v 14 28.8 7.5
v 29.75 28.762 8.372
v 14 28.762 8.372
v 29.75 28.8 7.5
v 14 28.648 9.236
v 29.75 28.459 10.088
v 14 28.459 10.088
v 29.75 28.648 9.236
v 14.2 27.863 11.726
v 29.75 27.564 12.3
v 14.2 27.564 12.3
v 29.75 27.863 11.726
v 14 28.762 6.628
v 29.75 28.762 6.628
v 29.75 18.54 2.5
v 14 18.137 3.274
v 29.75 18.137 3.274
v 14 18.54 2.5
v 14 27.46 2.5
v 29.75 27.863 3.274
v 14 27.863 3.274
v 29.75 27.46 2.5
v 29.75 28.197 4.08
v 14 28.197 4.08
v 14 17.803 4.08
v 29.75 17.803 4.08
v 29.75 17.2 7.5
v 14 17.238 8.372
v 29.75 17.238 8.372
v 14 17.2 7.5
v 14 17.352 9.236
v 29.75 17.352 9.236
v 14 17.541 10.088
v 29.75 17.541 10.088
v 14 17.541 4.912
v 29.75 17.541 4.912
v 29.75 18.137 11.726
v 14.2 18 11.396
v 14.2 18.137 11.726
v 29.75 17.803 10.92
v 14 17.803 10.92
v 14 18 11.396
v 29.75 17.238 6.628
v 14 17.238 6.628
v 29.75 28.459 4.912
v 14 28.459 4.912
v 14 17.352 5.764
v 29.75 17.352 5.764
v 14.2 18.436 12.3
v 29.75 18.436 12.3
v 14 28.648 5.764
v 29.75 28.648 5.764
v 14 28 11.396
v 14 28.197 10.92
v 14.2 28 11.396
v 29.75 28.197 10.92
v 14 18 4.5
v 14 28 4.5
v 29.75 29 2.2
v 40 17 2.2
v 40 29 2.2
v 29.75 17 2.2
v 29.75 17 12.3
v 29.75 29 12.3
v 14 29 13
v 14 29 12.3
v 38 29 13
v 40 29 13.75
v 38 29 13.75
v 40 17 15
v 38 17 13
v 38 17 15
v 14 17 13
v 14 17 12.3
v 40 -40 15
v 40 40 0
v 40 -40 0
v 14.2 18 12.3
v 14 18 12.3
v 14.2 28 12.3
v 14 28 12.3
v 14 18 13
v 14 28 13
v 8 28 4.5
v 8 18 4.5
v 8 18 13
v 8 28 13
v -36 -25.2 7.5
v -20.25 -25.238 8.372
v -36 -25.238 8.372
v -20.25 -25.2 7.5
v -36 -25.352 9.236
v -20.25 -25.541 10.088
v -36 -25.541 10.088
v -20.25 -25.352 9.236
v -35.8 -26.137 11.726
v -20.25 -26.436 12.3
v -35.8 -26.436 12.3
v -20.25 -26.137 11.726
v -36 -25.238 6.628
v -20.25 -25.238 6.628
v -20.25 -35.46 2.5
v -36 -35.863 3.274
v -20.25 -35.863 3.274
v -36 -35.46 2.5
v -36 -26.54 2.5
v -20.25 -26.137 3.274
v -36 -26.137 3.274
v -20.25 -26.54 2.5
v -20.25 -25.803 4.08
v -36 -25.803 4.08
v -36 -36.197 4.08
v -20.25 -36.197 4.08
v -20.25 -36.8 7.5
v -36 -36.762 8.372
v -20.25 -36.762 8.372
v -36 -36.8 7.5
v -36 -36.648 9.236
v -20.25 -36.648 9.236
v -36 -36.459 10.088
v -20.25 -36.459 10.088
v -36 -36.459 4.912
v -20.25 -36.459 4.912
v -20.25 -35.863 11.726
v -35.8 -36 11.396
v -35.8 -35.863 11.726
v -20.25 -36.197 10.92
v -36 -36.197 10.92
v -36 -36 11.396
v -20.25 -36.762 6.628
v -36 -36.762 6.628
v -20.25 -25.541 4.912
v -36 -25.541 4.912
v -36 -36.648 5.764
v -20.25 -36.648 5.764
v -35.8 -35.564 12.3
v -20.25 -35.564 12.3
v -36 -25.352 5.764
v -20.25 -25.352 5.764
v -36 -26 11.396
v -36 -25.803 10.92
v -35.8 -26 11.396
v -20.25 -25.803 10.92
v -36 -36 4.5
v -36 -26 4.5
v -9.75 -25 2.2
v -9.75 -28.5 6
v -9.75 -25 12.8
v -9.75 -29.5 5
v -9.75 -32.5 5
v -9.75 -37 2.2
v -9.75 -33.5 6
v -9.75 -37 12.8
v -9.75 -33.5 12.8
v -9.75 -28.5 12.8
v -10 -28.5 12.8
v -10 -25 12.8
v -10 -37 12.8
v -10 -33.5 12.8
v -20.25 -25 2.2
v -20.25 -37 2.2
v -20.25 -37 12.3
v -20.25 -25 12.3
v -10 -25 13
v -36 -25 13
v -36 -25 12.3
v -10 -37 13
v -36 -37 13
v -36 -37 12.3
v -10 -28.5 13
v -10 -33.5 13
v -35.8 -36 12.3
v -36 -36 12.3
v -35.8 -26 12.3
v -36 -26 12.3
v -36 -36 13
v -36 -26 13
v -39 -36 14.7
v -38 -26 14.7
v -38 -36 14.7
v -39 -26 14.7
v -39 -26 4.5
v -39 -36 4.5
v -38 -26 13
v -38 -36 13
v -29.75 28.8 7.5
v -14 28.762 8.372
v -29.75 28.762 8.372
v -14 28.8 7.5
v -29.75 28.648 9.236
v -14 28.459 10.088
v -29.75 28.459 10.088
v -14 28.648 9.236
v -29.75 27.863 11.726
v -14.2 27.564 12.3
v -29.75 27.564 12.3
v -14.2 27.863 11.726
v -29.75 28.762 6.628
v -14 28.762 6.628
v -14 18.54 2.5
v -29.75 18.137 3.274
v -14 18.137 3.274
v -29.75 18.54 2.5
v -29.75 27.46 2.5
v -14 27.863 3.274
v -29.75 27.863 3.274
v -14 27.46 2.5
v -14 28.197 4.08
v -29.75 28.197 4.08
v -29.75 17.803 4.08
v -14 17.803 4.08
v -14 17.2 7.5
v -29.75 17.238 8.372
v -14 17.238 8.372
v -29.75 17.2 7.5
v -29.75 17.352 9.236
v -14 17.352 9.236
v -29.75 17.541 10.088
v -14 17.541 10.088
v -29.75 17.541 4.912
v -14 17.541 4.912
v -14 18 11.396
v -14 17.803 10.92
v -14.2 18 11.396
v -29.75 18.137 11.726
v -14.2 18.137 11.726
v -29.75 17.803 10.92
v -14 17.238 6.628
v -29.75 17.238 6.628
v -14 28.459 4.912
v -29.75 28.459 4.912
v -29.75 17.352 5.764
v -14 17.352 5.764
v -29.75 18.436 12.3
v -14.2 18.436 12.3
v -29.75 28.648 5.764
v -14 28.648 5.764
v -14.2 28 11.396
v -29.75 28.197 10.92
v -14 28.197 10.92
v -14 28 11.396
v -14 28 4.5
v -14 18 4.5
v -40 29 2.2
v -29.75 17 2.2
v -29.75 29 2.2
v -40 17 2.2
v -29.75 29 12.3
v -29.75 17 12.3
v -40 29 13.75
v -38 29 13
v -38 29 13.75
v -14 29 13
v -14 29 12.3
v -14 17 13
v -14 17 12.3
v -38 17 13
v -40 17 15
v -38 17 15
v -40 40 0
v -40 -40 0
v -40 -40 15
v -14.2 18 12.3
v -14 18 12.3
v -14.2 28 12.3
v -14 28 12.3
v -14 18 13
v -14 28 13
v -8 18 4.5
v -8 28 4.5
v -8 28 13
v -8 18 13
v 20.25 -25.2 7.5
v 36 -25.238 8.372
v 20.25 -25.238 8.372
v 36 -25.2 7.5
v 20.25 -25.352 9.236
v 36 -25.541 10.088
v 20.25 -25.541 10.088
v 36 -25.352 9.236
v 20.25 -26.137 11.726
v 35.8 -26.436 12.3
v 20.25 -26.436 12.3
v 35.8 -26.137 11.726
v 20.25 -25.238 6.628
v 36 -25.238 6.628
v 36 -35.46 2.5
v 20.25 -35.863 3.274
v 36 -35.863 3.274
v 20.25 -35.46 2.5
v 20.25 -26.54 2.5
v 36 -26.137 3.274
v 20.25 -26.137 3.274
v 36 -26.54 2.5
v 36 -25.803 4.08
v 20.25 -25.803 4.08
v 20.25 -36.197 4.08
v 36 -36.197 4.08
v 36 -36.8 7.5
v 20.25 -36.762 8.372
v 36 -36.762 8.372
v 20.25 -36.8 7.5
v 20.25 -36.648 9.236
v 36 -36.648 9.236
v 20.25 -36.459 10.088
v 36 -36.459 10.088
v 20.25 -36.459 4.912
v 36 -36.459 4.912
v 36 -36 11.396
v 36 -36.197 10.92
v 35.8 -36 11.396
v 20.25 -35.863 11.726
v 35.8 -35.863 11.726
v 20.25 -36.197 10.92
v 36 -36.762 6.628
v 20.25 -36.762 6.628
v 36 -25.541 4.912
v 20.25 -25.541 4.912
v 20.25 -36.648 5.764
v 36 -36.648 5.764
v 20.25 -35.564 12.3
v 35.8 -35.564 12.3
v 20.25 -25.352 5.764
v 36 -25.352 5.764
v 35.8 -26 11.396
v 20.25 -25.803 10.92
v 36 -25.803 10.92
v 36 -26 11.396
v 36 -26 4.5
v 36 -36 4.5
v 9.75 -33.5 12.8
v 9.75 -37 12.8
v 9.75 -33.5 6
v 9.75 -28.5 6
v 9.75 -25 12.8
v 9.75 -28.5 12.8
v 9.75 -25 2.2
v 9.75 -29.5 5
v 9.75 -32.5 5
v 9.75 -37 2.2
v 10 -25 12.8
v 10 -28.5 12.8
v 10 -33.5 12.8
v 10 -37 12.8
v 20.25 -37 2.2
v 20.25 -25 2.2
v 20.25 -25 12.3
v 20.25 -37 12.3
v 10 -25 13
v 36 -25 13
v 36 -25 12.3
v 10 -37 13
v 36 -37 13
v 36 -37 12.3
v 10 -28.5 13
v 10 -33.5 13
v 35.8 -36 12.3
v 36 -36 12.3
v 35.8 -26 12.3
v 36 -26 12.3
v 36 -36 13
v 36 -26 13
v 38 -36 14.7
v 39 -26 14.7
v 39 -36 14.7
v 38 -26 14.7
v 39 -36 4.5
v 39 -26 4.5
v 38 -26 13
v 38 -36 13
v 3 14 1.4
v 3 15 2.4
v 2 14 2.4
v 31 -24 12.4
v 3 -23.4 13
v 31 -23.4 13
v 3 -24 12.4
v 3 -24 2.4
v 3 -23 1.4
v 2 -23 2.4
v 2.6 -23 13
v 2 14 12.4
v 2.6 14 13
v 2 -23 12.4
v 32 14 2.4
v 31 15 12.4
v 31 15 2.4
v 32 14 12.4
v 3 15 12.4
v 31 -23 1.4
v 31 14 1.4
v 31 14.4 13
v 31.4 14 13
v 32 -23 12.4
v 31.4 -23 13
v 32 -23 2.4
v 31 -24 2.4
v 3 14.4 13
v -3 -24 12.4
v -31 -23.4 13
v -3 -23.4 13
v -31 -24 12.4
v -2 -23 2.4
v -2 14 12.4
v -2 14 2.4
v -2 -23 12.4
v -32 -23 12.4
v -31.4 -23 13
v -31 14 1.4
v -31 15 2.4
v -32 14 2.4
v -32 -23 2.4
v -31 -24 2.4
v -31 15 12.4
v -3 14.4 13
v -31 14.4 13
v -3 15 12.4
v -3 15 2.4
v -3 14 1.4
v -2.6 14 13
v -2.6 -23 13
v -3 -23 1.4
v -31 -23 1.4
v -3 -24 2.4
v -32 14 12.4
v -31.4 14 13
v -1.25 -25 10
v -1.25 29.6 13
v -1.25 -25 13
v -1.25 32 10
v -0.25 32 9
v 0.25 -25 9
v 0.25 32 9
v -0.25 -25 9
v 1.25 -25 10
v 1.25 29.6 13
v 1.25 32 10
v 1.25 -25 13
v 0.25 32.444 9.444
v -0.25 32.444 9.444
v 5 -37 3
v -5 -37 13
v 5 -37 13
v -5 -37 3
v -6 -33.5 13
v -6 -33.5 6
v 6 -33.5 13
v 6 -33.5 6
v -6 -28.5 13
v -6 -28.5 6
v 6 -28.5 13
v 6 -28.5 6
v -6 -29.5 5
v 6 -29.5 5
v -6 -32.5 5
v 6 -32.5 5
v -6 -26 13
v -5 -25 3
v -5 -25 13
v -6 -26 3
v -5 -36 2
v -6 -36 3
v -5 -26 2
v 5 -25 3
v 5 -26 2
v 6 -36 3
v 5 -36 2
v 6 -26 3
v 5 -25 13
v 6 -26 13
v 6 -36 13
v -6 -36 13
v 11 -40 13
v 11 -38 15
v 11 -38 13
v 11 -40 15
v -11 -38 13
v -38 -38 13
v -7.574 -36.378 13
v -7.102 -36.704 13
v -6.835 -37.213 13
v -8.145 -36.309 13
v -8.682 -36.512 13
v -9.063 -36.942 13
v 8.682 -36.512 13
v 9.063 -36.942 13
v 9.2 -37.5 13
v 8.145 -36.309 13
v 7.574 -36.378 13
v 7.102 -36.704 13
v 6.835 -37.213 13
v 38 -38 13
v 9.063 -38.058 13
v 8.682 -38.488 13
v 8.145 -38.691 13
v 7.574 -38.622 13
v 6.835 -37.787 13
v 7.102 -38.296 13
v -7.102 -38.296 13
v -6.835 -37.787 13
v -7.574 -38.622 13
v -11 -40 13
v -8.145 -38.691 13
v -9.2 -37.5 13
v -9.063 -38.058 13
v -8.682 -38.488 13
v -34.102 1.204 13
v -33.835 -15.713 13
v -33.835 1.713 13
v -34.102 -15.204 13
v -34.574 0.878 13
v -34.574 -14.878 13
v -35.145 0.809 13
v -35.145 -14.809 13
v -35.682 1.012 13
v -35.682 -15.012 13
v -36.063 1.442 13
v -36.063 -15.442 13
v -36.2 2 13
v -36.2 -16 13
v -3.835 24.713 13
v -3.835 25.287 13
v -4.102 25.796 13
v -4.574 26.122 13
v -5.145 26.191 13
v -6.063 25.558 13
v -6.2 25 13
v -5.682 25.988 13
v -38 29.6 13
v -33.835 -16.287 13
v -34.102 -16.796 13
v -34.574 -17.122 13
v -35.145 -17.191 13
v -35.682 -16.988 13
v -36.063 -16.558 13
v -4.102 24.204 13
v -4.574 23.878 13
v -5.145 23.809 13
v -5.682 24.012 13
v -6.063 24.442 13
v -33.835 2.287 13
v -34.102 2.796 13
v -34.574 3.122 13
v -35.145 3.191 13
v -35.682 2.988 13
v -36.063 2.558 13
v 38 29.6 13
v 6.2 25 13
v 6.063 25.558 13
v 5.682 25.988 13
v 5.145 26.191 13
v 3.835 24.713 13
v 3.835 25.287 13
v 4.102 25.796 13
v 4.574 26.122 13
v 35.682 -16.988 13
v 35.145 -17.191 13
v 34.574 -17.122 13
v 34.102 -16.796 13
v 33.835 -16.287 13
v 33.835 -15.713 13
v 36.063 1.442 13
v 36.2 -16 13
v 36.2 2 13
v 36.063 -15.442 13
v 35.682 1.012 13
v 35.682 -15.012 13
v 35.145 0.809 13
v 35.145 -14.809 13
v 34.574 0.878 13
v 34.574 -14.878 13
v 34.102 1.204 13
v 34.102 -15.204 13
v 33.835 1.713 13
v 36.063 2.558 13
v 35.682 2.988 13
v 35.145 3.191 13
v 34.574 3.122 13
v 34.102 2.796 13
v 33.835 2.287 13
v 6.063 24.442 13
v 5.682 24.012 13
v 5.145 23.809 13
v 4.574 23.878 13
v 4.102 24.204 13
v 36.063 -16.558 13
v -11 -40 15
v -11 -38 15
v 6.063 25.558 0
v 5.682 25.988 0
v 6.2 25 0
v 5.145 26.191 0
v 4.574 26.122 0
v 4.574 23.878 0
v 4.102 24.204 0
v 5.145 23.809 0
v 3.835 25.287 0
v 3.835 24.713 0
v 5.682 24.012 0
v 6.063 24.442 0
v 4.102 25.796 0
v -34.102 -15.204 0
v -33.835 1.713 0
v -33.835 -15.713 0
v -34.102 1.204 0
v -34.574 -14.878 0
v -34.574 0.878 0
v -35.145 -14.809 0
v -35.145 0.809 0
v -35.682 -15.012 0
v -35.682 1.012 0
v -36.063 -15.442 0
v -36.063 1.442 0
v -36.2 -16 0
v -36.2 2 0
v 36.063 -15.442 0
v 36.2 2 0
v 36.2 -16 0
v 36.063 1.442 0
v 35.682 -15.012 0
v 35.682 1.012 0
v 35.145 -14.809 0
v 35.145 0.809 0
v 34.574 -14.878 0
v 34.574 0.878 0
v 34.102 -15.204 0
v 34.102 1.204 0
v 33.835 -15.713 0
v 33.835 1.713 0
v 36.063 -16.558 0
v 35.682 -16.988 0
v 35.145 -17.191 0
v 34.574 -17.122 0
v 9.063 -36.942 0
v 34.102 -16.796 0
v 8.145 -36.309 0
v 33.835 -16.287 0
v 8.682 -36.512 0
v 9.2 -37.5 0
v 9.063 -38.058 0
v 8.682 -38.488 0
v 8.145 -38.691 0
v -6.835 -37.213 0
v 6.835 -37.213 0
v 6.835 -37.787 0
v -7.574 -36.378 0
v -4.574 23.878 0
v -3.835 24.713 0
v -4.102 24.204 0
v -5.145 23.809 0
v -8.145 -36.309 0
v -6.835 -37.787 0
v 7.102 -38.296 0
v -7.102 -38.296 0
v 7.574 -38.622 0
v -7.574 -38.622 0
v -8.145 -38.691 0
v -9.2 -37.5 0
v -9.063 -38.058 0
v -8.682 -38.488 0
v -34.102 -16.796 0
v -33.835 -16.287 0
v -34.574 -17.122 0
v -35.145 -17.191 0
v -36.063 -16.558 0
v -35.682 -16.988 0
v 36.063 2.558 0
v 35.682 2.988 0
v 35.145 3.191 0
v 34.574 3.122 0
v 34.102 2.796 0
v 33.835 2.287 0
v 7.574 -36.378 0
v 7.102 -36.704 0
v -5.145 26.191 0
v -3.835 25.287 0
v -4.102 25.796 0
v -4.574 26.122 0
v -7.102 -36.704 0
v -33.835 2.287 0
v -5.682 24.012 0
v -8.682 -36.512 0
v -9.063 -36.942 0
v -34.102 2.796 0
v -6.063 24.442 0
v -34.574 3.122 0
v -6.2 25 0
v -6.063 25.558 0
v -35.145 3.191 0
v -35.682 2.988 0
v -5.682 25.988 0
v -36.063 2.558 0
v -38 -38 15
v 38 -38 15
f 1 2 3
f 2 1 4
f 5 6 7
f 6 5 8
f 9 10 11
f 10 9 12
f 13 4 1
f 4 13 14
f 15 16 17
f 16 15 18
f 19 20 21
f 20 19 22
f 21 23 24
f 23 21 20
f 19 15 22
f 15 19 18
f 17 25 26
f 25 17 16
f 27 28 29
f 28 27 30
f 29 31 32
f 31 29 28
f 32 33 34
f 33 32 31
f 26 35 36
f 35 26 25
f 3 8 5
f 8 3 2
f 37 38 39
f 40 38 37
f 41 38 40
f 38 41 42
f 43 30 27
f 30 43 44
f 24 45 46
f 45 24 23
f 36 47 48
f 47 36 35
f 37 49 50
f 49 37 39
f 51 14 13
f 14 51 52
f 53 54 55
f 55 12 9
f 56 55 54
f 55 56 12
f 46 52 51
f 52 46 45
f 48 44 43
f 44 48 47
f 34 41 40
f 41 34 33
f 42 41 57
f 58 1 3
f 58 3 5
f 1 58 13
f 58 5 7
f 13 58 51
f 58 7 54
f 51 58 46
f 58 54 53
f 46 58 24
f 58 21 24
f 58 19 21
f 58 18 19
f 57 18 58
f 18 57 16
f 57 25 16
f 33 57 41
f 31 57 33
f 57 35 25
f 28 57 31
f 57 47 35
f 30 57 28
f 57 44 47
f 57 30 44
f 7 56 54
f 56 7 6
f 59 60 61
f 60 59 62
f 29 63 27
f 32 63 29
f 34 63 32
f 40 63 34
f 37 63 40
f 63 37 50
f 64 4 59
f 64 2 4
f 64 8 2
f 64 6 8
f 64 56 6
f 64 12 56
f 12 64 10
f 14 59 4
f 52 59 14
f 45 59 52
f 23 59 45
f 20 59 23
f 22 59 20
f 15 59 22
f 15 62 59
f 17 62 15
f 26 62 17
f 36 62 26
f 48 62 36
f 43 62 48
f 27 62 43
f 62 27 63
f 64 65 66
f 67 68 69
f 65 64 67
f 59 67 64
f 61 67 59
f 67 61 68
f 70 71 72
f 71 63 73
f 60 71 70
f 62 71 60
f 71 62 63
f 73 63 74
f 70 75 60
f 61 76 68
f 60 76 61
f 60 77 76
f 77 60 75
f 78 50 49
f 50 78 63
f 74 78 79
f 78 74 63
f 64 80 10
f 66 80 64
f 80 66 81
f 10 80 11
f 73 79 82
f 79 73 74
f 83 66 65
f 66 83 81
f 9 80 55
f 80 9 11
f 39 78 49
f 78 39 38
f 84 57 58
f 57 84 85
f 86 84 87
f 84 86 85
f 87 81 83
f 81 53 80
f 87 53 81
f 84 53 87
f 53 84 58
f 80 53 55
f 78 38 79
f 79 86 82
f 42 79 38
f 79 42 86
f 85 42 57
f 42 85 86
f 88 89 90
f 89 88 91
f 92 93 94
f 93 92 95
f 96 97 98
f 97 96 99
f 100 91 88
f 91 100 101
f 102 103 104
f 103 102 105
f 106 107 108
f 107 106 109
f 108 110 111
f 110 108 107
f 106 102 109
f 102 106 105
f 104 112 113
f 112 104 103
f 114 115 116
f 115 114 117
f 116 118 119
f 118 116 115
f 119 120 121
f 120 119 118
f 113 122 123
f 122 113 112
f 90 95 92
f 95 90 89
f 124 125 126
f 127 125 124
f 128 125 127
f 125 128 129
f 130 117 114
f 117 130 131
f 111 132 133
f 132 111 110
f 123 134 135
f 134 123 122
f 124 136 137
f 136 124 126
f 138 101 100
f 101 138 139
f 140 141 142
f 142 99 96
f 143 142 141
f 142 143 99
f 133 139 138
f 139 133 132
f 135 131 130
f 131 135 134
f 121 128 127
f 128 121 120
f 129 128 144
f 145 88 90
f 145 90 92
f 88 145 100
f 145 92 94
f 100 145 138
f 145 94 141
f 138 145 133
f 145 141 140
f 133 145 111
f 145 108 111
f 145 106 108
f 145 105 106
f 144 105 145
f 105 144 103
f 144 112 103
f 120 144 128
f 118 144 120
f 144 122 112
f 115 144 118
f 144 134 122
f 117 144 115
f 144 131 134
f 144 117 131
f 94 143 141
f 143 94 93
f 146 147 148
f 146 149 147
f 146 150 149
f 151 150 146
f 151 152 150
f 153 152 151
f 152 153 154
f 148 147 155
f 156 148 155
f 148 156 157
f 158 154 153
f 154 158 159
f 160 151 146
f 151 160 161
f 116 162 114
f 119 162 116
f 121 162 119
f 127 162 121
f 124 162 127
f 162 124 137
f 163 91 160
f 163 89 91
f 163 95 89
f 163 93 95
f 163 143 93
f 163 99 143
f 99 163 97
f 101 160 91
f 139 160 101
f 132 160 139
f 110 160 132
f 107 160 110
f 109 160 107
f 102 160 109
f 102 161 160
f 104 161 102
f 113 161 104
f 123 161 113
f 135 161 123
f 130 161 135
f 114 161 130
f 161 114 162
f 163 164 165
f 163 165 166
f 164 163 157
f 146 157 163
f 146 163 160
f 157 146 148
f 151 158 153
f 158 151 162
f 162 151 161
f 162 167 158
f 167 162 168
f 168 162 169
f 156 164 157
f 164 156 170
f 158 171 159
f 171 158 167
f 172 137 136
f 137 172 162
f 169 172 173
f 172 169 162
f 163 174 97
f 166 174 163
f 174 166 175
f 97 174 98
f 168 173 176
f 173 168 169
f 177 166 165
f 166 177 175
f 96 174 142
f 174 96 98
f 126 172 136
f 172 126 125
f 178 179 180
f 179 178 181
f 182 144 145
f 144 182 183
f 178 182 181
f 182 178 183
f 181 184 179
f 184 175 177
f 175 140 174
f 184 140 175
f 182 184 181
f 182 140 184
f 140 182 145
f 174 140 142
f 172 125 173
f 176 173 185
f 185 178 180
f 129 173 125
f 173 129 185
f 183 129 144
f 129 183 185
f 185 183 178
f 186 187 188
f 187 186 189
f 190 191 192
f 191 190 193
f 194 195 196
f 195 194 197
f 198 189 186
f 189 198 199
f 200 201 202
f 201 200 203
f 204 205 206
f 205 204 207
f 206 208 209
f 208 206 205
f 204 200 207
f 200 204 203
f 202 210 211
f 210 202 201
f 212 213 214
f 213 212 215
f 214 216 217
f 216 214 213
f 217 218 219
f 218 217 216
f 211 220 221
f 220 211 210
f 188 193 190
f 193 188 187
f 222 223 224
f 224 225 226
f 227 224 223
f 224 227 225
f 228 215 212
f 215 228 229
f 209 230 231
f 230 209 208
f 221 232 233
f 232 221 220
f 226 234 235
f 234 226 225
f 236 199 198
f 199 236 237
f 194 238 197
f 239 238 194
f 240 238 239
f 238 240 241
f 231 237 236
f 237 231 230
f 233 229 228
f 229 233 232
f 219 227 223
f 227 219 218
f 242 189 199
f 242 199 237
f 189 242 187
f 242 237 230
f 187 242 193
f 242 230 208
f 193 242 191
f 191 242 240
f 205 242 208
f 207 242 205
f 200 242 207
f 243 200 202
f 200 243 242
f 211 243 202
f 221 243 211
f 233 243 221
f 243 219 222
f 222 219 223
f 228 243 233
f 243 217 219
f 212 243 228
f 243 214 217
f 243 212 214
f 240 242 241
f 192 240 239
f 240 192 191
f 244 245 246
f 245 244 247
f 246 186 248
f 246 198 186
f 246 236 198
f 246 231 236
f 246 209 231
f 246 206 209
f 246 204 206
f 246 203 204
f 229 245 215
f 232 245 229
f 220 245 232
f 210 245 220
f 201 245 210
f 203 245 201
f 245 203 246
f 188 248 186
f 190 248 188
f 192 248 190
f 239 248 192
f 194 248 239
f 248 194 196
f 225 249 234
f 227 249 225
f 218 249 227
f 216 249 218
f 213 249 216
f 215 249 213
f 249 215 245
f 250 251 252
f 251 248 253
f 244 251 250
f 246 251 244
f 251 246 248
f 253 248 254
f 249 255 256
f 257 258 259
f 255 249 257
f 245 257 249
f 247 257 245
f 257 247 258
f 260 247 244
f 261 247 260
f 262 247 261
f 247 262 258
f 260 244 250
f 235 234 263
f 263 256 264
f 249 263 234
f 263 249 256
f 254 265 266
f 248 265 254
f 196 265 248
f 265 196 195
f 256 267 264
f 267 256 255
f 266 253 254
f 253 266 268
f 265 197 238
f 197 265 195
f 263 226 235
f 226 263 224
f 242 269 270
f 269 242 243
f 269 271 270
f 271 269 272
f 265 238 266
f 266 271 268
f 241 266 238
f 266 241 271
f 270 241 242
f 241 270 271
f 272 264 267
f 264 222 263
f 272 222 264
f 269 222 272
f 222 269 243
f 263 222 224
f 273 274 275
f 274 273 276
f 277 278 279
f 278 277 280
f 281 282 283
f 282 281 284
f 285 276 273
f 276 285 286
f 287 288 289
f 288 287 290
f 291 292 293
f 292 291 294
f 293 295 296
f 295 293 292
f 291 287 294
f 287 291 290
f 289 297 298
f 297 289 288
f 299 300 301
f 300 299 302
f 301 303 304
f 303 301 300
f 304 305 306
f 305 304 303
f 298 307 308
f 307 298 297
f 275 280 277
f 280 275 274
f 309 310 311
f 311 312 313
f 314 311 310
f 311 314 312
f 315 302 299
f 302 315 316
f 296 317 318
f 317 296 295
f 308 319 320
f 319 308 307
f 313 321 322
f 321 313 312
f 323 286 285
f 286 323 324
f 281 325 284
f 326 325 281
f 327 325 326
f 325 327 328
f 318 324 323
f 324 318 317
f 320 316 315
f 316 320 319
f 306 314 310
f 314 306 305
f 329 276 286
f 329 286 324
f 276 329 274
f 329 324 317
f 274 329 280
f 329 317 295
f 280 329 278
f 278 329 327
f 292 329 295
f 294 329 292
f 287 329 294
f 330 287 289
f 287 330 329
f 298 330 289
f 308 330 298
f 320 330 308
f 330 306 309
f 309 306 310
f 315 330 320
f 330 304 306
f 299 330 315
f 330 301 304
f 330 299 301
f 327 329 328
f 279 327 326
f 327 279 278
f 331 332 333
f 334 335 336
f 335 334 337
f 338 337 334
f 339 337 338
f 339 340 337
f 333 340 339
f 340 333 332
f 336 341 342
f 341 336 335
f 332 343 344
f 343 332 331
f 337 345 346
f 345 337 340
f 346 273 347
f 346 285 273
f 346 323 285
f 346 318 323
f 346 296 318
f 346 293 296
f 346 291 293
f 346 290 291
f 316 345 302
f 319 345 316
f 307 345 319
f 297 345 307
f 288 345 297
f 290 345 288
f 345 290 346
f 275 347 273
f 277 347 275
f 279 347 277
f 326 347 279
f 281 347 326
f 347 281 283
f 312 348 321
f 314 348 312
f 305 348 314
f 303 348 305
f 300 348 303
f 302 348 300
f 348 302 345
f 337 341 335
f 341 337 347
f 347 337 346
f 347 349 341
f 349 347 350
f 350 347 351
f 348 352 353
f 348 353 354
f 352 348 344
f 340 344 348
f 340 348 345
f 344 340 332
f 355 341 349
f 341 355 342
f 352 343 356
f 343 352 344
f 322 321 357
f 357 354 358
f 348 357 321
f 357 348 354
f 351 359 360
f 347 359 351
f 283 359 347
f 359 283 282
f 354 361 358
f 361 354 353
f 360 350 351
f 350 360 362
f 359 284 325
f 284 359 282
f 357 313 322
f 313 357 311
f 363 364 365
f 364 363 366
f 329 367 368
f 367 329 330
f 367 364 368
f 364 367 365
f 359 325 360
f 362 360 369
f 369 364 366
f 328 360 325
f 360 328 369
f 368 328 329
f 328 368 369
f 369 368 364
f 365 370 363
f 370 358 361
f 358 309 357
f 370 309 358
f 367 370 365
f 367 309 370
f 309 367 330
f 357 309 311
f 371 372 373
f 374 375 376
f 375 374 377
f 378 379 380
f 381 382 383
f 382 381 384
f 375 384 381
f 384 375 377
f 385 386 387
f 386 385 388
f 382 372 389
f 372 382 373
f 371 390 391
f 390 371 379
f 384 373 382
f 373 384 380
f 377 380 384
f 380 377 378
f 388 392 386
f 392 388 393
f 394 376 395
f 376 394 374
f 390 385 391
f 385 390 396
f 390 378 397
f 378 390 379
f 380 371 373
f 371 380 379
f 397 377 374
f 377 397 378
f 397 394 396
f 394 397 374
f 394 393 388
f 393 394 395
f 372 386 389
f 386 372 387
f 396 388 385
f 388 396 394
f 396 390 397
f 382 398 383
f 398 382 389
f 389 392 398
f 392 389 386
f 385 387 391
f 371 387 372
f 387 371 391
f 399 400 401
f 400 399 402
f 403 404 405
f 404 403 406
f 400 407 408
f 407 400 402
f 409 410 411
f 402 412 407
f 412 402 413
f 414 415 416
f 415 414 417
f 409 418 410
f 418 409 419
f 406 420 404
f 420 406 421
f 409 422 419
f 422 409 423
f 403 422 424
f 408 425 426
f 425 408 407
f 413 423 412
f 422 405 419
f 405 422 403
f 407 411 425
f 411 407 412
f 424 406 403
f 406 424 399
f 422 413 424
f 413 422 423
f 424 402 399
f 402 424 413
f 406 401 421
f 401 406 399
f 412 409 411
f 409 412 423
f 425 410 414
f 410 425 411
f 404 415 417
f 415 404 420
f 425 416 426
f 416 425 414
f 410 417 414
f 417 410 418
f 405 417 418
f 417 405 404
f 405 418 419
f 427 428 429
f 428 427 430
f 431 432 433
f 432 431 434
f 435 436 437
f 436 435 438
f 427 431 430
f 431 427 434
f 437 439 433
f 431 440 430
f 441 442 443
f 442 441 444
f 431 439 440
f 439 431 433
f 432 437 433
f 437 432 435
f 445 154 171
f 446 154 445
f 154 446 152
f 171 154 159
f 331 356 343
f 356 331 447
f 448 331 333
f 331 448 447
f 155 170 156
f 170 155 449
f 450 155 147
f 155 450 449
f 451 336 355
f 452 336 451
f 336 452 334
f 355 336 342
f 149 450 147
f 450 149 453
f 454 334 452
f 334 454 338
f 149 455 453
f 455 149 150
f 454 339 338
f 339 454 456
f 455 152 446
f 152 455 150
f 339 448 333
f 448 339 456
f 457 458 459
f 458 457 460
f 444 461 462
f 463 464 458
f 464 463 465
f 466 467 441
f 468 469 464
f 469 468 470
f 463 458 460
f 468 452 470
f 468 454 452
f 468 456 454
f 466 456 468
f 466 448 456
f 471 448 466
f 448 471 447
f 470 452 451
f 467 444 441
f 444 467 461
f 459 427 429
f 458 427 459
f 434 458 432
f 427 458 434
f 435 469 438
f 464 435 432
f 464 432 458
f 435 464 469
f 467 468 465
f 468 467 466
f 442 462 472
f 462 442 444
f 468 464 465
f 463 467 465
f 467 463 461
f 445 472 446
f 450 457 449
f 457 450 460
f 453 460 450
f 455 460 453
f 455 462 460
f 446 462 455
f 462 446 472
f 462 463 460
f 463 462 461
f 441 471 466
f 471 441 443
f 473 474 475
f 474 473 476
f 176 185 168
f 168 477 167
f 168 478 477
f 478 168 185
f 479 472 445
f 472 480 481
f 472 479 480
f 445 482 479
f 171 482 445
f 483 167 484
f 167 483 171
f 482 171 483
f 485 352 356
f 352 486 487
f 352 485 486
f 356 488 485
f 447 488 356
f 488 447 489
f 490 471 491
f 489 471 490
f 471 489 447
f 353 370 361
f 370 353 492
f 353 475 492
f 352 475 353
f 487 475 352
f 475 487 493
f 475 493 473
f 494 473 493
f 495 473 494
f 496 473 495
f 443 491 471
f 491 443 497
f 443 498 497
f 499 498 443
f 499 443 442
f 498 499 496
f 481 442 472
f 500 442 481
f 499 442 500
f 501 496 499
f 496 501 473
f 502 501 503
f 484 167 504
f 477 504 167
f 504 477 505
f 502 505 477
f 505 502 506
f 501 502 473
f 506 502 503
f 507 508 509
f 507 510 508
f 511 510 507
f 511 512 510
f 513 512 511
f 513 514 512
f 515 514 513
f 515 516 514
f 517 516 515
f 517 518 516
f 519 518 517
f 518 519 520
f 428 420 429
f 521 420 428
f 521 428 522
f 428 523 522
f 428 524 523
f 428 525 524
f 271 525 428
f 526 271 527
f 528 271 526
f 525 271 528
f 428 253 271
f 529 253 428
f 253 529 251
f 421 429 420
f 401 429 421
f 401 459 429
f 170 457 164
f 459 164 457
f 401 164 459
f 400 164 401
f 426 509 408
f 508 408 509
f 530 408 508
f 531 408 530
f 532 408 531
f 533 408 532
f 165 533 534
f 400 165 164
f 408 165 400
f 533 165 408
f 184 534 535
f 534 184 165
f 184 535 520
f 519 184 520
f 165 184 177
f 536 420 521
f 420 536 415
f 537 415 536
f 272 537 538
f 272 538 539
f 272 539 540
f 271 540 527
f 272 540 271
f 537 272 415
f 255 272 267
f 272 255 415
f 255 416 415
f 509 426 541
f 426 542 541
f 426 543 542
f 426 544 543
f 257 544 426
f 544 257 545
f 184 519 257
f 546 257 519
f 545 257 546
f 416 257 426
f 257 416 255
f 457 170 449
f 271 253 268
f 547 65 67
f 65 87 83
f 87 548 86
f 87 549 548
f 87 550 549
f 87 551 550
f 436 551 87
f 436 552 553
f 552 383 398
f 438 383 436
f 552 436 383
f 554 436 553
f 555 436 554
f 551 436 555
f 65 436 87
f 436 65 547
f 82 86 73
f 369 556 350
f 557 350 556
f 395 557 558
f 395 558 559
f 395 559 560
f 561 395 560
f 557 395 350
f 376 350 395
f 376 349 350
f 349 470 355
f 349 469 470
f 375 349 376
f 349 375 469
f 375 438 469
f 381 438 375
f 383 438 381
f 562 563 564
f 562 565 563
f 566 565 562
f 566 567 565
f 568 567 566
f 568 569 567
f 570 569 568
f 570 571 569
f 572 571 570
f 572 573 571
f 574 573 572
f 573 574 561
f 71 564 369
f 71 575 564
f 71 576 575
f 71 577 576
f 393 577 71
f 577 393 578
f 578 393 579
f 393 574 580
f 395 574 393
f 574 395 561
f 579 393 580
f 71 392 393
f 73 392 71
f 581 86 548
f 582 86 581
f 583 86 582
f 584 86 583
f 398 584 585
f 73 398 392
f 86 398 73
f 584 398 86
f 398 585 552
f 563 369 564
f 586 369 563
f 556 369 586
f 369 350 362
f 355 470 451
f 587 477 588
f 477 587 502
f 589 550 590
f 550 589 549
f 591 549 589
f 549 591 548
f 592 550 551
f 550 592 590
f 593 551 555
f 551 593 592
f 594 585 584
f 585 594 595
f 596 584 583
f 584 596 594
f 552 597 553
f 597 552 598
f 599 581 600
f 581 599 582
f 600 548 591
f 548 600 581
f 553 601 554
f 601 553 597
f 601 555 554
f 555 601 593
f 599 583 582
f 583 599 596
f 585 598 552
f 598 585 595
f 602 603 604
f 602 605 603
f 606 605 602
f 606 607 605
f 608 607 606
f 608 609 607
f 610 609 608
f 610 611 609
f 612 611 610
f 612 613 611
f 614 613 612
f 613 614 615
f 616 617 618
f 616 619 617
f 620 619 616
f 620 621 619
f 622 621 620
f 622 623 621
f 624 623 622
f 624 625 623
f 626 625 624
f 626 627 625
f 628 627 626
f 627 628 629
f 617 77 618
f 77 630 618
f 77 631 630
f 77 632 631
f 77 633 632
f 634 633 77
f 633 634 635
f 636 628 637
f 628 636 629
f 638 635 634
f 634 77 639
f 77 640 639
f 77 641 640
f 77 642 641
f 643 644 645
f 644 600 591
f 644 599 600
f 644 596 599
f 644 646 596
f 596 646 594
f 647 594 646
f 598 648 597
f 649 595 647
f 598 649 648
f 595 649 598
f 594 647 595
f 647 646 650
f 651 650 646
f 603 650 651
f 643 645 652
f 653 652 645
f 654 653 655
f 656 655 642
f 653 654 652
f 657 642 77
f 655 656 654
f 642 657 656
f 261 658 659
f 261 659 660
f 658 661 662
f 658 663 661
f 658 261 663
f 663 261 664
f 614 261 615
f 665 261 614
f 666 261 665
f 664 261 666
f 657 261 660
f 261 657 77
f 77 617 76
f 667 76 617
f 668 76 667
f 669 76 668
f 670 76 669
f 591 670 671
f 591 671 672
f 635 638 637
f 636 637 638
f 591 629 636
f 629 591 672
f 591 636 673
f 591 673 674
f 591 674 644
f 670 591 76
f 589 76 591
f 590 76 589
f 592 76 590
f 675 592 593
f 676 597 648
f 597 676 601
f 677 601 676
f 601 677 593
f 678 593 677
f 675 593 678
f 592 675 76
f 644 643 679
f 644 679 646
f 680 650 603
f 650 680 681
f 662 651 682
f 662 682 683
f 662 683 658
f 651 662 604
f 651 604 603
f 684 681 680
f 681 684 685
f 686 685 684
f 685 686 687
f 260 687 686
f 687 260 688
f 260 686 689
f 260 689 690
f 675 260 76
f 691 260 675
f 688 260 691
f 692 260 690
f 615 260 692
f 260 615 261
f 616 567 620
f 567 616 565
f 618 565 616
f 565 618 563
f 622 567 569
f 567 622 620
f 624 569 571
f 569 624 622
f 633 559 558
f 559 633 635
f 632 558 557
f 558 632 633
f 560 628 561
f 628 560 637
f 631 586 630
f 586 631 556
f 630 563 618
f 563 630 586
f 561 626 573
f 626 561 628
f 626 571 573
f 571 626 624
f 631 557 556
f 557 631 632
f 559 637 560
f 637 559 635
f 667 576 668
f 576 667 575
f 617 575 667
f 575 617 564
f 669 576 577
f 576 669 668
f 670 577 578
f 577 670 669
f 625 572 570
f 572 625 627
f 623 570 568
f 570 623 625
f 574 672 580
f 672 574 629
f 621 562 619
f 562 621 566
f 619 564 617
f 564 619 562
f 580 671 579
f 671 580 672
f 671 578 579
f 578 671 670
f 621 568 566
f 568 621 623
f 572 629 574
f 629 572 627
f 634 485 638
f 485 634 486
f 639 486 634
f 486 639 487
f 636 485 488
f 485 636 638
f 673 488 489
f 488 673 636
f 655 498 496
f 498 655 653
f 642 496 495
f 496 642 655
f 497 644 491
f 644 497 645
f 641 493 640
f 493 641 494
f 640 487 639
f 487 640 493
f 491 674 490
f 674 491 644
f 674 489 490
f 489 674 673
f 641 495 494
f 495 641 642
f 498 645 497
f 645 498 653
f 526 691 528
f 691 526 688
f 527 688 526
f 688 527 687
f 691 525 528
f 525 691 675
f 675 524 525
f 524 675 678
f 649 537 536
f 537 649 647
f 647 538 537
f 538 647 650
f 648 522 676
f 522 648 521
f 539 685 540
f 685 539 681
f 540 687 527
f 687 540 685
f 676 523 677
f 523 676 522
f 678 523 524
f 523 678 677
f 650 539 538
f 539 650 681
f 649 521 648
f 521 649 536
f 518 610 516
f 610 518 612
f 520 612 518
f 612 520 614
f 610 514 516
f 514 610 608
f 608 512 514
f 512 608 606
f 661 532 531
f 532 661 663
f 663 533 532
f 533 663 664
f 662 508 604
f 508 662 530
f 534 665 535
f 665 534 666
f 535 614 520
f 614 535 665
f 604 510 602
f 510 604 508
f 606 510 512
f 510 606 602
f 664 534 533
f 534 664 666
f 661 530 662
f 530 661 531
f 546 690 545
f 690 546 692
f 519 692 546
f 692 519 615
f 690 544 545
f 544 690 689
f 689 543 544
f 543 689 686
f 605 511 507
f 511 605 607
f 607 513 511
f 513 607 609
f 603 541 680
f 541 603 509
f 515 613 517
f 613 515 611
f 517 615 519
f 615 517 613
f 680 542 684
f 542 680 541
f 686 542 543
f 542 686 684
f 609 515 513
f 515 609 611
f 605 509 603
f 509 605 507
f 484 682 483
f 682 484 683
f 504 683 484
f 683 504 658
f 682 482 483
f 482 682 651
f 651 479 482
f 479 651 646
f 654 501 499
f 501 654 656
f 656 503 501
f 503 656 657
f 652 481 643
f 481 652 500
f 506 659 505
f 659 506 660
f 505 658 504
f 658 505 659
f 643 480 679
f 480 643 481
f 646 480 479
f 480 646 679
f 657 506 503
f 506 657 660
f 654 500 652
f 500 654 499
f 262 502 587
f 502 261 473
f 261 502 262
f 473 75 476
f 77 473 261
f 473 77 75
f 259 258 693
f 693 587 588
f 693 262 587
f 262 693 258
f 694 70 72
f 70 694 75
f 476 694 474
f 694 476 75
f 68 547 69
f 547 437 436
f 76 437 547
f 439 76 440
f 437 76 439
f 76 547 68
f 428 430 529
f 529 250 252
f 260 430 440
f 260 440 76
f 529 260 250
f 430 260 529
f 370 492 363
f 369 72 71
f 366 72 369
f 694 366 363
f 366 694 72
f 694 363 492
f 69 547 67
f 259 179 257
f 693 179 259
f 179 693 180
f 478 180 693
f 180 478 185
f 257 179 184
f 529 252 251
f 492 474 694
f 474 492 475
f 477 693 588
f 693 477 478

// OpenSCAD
// file: inc/bevel_lib.scad
// Bevelled boxes, etc
module roundedbox(size=[1.0, 1.0, 1.0, ], radius = 0.1) {
    hull() {
        for (x = [radius, size[0] - radius]) {
            for (y = [radius, size[1] - radius]) {
                for (z = [radius, size[2] - radius]) {
                    translate([x,y,z])
                        sphere(r=radius);
                }
            }
        }
    }
}

module rounded_square_centered(size=[1,1], radius=0.1) {
    hull() {
        for (x = [- size[0] / 2 + radius, size[0] / 2 - radius]) {
            for (y = [- size[1] / 2 + radius, size[1] / 2 - radius]) {
                translate([x,y]) circle(radius);
            }
        }
    }
}

// Bevelled in x and y axes.
module bevelledbox(size=[1,1,1], radius=0.1) {
    linear_extrude(height=size[2]) {
        // 8-sided polygon
        polygon(points=[
            // Left
            [0, radius ],
            [0, size[1] - radius ],
            // Top
            [radius, size[1]],
            [size[0] - radius, size[1]],
            // Right
            [size[0], size[1] - radius],
            [size[0], radius],
            // Bot
            [size[0] -radius, 0],
            [radius, 0]
            ]);
    }
}

module bevelledbox_y(size=[1,1,1], radius=0.1) {
    // Bevelled around y
    translate([0,0,size[2]])
        rotate(-90, [1,0,0])
            bevelledbox([size[0], size[2], size[1]], radius); 
}

module bevelledbox_x(size=[1,1,1], radius=0.1) {
    // Bevelled around x
    translate([size[0],0,0])
        rotate(-90, [0,1,0])
            bevelledbox([size[2], size[1], size[0]], radius); 
}

// Draw origin-centred, unit polyhedron.
module octahedron(C0=1.0) {
    polyhedron(points = [
        [0.0, 0.0,  C0],
        [0.0, 0.0, -C0],
        [ C0, 0.0, 0.0],
        [-C0, 0.0, 0.0],
        [0.0,  C0, 0.0],
        [0.0, -C0, 0.0]
        ],
        faces = [
[ 4 , 2, 0],
[ 3 , 4, 0],
[ 5 , 3, 0],
[ 2 , 5, 0],
[ 5 , 2, 1],
[ 3 , 5, 1],
[ 4 , 3, 1],
[ 2 , 4, 1]
        ]
    );
}

module fullybevelledbox(size=[1,1,1], radius=0.1) {
    hull() {
        for (x = [radius, size[0] - radius]) {
            for (y = [radius, size[1] - radius]) {
                for (z = [radius, size[2] - radius]) {
                    translate([x,y,z])
                        octahedron(radius);
                }
            }
        }
    }
}
// file: inc/utils.scad
// 2d polyline, circles connected by segments.
// Points is an array of arrays with a minimum of 2 elements.
module polyline(points, radius)
{
    polyline_hulls(points) {
        circle(radius);
    }
}

// Do a polyline, by making hulls between each pair of points
// and duplicating children() at those points...
module polyline_hulls(points) {
    for (i=[0:len(points)-2]) {
        p1 = points[i];
        p2 = points[i+1];
        hull() {
            translate(p1) children();
            translate(p2) children();
        }
    }    
}

module mirror_x()
{
    union() {
        children();
        mirror([1,0,0]) children();
    }
}

module mirror_y()
{
    union() {
        children();
        mirror([0,1,0]) children();
    }
}

module mirror_z()
{
    union() {
        children();
        mirror([0,0,1]) children();
    }
}

// Draw origin-centred, unit polyhedron.
module octahedron(C0=1.0) {
    polyhedron(points = [
        [0.0, 0.0,  C0],
        [0.0, 0.0, -C0],
        [ C0, 0.0, 0.0],
        [-C0, 0.0, 0.0],
        [0.0,  C0, 0.0],
        [0.0, -C0, 0.0]
        ],
        faces = [
[ 4 , 2, 0],
[ 3 , 4, 0],
[ 5 , 3, 0],
[ 2 , 5, 0],
[ 5 , 2, 1],
[ 3 , 5, 1],
[ 4 , 3, 1],
[ 2 , 4, 1]
        ]
    );
}

module diamond(C0=1.0) {
    rotate([0,0,45])
        square([C0 * sqrt(2), C0 * sqrt(2)], center=true);
}

// Rounded rectangle, centred.
module rounded_rect(w,h,r)
{
    hull() {
        translate([(-w / 2) + r, (-h / 2) + r])
            circle(r);
        translate([(w / 2) - r, (-h / 2) + r])
            circle(r);
        translate([(-w / 2) + r, (h / 2) - r])
            circle(r);
        translate([(w / 2) - r, (h / 2) - r])
            circle(r);
    }
}
// file: n20.scad
/*
 * N20 gear motor
 */

$fs = 0.4; // millimetres; smallest segment

motor_w = 16; // Width of motor (x axis)
motor_h = 10; // motor height
motor_d = 12; // y
gearbox_h = 10.6;
gearbox_d = 12;
gearbox_w = 10;
 
module n20_motor(margin=0.2)
{
    motor_d_half = motor_d / 2;
    motor_w_half = motor_w / 2;
    gearbox_w_half = gearbox_w / 2;
    // Oval motor body
    curve_rad = 10;
    translate([-motor_w_half - gearbox_w,0,0])
    rotate([0,90,0]) {
        $fa = 5.0; // more polygons?
        linear_extrude(motor_w, center=true) {
            intersection() {
            
                translate([0, motor_d_half - curve_rad - margin])
                    circle(r=curve_rad);
                translate([0, -motor_d_half + curve_rad + margin])
                    circle(r=curve_rad);
                square([motor_h,motor_d + (margin*2)], center=true);
            }
        }
    }
    // Cube gearbox
    translate([- gearbox_w_half, 0,0]) {
        cube([ gearbox_w + 0.1 + (margin*2), gearbox_d, gearbox_h], center=true); 
    }
    // Shaft
    translate([0,0,0]) {
        rotate([0,90,0]) {
            cylinder(h=10, r=1.5);
        }
    }
}

module n20_motor_top_ext(back_part=6.0) {
    // Motor with a box on top
    // And a cylinder out the back.
    n20_motor();
    translate([-motor_w-gearbox_w, -(motor_d/2), motor_h/2 - 0.2])
        cube([motor_w+gearbox_w, gearbox_d, gearbox_h]);
        
    // This is a cutout for wiring, terminals etc
    back_x = -motor_w-gearbox_w - back_part;
    translate([back_x, -(motor_d/2) + 1, -motor_h/2 + 2]) {
        cube([back_part + 0.2, motor_d - 2, motor_h + 0.2]);
    }
}

n20_motor();
// main file
use <n20.scad>;
use <inc/utils.scad>;
use <inc/bevel_lib.scad>;

$fs = 0.6; // millimetres

shell_w = 80;
shell_d = 80;
shell_h = 15;

drive_motor_y = 23;
flip_motor_y = -31;

front_slope = 12;
rear_slope = 0; // Set this to slope the rear backwards

shell_d_half = shell_d / 2;
shell_w_half = shell_w / 2;

module mirror_xy() {
    mirror_x() {
        mirror_y() {
            children();
        }
    }
}

module side_outline() {
    // Make the quad for the main shape
    // 2d, centred on the x axis
    polygon(
        [
            [-shell_d_half, 0],
            [-shell_d_half - rear_slope, shell_h],
            [shell_d_half - front_slope, shell_h],
            [shell_d_half, 0]
        ]
        );
}

module motor_cutouts() {
    shell_w_half = shell_w/2;
    mirror_x() {
        // Drive motors
        translate([shell_w_half,drive_motor_y,shell_h/2]) {
            n20_motor_top_ext();
        }
        // Flip motors - these point inwards.
        translate([-10,flip_motor_y,shell_h/2]) {
            n20_motor_top_ext(back_part=3.0);        
        }
    }
}

module lid_cutout() {
    translate( [0,0,(shell_h * 1.5) - 2]) {
        cube([shell_w - 4, shell_d - 4, shell_h], center=true);
    }
}

module other_cutouts() {
    // Cutouts: Battery / gubbins compartment
    // fullybevelledbox is not centred.
    mirror_x() {
        translate([2, -24, 1 + 0.4])
            fullybevelledbox([30,39, shell_h -3], radius=1.0);
    }
    // Wiring cutouts
    // Lengthwise cutout
    translate([-1.25,-shell_d_half + 3, 9])
        fullybevelledbox([2.5, shell_d - 10, shell_h], radius=1.0);
    // Cutout for the flipper axle etc
    translate([-11, flip_motor_y - 2.5, shell_h - 10])
        fullybevelledbox([22, 5, shell_h], radius=1.0);
    // Cutout for the flipper axle bits
    translate([-6, flip_motor_y - 6, 2])
        fullybevelledbox([12, 12, shell_h], radius=1.0);
    // Cut out the rear
    translate([0, -shell_d_half, shell_h])
        cube([22,5,4], center=true);
}

screw_locations = [
    [5, shell_d_half - 15], 
    [shell_w_half - 5, -shell_d_half + 24],
    [shell_w_half - 5, -shell_d_half + 42],
    [8, -shell_d_half + 2.5]
];

module screw_holes() {
    // We could use M2 bolts, self tappers or something else.
    r=1.2;
    mirror_x() {
        for (location = screw_locations) {
            translate(location)
                cylinder(r=r, h=shell_h +25);
        }
    }
}

module main()
{
    difference() {
        rotate([0,0,90])
        rotate([90,0,0])
            linear_extrude(height=shell_w, center=true) {
                side_outline();
            }
        motor_cutouts();
        lid_cutout();
        other_cutouts();
        screw_holes();
    }
}

main();
